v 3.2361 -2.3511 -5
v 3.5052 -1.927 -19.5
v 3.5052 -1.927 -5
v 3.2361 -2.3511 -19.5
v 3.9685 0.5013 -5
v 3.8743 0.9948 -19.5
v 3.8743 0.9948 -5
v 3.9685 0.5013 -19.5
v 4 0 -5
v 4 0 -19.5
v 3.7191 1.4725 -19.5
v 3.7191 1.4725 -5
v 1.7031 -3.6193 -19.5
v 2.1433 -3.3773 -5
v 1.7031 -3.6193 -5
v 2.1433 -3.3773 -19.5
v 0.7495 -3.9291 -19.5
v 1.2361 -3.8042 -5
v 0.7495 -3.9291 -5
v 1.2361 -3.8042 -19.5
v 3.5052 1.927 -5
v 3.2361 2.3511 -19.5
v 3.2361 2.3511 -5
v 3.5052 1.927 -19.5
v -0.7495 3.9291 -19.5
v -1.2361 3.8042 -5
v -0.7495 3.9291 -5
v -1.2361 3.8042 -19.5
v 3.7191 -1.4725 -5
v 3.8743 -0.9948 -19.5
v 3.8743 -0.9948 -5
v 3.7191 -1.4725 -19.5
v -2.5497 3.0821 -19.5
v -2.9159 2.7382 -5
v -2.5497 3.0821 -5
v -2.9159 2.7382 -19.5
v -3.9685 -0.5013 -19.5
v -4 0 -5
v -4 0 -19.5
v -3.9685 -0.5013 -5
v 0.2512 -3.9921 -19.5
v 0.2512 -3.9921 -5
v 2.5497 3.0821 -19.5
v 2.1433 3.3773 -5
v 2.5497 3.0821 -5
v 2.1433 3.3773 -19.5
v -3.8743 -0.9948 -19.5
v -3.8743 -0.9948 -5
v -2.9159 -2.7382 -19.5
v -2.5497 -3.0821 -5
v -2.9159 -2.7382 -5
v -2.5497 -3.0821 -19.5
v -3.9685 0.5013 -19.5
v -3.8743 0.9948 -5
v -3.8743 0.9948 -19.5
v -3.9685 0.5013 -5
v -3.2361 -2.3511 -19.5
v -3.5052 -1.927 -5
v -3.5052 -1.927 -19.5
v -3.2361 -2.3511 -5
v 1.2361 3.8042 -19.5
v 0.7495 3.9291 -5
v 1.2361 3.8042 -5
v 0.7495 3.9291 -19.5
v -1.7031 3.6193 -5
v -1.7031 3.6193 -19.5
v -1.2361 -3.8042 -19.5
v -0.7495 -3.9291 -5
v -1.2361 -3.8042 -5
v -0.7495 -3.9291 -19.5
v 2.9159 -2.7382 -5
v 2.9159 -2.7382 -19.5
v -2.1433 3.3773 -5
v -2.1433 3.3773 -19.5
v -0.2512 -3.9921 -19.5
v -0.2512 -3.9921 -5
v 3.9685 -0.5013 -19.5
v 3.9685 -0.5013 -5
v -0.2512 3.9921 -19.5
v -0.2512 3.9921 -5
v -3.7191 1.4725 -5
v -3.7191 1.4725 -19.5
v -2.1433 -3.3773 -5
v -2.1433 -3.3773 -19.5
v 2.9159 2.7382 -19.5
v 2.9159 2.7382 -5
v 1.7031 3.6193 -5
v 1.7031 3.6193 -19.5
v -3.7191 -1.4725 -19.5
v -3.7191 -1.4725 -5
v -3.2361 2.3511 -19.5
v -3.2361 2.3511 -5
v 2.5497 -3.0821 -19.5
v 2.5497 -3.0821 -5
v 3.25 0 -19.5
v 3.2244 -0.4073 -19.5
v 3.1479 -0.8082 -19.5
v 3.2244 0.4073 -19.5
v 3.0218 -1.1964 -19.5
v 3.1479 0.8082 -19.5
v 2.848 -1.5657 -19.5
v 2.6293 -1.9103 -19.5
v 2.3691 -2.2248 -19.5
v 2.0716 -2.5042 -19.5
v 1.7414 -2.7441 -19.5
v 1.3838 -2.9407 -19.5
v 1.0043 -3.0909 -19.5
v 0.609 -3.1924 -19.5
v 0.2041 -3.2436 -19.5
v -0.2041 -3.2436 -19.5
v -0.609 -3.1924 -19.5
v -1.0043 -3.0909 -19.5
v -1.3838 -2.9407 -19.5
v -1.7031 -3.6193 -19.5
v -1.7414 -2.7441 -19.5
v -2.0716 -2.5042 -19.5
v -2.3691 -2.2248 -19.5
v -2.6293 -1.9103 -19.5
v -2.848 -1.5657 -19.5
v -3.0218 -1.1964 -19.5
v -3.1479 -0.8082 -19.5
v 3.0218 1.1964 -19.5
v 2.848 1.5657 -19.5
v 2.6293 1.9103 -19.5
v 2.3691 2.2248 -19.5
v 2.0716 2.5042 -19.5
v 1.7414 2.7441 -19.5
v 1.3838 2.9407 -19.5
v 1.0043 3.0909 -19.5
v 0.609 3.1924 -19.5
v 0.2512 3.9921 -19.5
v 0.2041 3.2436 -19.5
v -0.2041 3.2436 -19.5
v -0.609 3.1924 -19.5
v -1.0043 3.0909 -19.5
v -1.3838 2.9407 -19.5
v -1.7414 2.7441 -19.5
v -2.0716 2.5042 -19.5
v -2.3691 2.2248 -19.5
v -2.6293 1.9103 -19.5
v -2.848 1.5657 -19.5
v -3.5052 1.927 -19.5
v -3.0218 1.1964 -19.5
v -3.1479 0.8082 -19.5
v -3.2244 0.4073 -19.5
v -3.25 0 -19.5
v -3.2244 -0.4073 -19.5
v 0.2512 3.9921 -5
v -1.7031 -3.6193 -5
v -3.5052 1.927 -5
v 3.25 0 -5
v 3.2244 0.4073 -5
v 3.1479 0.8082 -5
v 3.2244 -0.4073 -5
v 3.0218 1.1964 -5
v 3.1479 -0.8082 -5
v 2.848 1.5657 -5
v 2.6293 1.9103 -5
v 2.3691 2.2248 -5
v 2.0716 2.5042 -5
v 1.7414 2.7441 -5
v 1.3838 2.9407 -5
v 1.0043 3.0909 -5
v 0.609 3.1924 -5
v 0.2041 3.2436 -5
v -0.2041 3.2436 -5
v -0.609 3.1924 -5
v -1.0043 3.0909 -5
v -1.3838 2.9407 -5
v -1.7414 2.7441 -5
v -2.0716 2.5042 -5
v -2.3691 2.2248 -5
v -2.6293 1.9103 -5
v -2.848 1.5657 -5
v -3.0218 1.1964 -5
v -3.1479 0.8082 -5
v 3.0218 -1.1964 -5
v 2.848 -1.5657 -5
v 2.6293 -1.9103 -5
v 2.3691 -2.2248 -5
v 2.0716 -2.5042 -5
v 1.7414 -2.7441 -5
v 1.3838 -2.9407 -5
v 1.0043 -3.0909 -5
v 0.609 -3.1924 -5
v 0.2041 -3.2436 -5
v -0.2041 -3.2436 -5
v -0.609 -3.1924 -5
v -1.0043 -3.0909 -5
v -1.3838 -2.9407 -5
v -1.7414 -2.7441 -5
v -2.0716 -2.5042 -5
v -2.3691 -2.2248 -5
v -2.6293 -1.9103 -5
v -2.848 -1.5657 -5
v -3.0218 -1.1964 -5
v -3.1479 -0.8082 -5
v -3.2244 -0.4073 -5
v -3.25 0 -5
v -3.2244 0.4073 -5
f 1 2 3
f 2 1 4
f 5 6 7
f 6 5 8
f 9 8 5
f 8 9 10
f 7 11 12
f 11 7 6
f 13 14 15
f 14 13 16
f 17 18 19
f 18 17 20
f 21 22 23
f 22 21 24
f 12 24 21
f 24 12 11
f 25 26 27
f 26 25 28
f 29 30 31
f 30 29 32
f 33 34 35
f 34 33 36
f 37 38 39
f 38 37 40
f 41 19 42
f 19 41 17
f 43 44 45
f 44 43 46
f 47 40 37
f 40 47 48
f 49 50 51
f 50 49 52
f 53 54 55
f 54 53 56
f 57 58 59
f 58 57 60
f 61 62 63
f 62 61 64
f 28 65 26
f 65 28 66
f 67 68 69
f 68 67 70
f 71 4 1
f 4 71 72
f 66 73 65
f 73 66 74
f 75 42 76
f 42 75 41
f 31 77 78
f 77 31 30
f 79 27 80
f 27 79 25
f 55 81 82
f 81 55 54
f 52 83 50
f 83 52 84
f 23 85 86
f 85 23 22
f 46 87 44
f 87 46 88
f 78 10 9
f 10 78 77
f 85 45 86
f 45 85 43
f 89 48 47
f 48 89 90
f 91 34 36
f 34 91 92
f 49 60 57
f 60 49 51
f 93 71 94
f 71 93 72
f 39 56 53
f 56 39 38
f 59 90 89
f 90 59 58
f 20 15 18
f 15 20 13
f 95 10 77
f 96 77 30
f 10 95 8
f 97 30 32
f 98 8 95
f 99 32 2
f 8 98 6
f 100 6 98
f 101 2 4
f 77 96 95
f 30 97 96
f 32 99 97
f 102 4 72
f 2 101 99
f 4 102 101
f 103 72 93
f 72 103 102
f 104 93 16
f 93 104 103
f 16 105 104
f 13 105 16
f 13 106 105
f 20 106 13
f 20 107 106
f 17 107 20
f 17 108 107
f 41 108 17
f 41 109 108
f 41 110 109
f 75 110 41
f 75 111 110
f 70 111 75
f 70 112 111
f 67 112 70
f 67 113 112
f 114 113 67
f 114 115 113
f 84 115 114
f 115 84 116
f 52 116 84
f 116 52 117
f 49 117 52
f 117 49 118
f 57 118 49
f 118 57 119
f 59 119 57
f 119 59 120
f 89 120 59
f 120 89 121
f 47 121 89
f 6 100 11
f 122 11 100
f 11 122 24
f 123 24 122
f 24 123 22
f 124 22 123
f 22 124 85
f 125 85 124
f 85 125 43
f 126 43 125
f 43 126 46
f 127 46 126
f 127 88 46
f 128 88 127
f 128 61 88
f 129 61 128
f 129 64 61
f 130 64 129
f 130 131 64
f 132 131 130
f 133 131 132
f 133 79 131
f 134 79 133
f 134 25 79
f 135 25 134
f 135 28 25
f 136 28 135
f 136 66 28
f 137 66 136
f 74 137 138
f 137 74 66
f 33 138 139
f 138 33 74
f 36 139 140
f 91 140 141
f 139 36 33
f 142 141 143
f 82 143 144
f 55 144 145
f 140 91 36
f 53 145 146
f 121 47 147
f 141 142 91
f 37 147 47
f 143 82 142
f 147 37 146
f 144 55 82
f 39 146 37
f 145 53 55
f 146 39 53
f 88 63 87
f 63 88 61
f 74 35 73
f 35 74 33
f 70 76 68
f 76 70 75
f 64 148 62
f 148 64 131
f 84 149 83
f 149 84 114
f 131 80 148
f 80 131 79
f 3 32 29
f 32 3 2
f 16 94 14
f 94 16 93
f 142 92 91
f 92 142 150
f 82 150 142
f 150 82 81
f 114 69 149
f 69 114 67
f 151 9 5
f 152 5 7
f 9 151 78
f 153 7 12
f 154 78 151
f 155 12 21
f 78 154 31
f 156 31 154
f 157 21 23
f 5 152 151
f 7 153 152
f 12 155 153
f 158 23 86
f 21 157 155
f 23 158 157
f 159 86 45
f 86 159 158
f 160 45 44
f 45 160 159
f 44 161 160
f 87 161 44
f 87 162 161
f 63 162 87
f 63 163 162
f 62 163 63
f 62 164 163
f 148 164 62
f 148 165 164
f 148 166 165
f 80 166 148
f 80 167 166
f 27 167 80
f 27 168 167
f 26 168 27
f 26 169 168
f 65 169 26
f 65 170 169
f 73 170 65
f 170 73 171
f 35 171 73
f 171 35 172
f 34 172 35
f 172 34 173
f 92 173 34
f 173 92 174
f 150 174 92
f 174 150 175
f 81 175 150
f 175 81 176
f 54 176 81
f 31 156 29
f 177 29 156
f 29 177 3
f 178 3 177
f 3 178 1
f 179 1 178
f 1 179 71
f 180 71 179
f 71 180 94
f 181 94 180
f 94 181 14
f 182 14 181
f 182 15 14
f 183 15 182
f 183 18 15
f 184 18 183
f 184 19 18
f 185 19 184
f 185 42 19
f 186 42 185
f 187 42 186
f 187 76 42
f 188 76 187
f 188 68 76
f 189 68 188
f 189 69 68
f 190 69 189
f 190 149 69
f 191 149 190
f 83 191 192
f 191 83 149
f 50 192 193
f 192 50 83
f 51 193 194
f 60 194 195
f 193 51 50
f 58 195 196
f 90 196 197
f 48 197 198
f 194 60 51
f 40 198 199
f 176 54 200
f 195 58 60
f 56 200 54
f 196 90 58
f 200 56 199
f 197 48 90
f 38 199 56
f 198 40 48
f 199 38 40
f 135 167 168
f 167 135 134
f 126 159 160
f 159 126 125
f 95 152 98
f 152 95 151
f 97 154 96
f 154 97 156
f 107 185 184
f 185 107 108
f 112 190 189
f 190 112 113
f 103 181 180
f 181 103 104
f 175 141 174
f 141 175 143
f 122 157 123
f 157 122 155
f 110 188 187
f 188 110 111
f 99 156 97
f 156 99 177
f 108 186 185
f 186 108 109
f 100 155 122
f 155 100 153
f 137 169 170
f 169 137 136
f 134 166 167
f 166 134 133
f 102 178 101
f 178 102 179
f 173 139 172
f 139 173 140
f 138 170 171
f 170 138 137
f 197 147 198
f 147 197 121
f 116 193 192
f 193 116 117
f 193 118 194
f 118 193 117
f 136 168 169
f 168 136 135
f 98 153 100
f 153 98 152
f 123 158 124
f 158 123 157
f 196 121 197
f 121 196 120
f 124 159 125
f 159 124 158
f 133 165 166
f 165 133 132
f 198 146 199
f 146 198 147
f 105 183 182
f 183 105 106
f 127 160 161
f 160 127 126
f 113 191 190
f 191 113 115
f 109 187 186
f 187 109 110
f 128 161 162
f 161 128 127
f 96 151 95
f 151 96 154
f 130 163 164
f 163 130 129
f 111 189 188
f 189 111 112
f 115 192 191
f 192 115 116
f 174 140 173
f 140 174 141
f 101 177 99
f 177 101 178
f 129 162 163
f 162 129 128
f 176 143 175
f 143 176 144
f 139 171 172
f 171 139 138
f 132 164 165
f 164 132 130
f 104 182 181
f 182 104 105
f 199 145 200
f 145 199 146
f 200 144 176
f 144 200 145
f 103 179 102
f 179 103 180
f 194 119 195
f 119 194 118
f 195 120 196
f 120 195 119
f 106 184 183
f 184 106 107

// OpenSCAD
$fn = 50;

difference() {
	union() {
		translate(v = [0, 0, -19.5]) {
			cylinder(h = 19.5, r = 4.0);
		}
		#translate(v = [0, 0, -21.0]) {
			cylinder(h = 21, r = 2.875);
		}
	}
	union() {
		translate(v = [0, 0, 0]) {
			rotate(a = [0, 0, 0]) {
				difference() {
					union() {
						translate(v = [0, 0, -5]) {
							linear_extrude(height = 5) {
								polygon(points = [[5.914249999999999, 0.0], [2.957125, 5.1218907443321156], [-2.9571249999999982, 5.1218907443321156], [-5.914249999999999, 7.242867331857232e-16], [-2.9571250000000022, -5.121890744332115], [2.9571249999999956, -5.121890744332118]]);
							}
						}
					}
					union();
				}
			}
		}
		#translate(v = [0, 0, -100.0]) {
			cylinder(h = 200, r = 3.25);
		}
	}
}
